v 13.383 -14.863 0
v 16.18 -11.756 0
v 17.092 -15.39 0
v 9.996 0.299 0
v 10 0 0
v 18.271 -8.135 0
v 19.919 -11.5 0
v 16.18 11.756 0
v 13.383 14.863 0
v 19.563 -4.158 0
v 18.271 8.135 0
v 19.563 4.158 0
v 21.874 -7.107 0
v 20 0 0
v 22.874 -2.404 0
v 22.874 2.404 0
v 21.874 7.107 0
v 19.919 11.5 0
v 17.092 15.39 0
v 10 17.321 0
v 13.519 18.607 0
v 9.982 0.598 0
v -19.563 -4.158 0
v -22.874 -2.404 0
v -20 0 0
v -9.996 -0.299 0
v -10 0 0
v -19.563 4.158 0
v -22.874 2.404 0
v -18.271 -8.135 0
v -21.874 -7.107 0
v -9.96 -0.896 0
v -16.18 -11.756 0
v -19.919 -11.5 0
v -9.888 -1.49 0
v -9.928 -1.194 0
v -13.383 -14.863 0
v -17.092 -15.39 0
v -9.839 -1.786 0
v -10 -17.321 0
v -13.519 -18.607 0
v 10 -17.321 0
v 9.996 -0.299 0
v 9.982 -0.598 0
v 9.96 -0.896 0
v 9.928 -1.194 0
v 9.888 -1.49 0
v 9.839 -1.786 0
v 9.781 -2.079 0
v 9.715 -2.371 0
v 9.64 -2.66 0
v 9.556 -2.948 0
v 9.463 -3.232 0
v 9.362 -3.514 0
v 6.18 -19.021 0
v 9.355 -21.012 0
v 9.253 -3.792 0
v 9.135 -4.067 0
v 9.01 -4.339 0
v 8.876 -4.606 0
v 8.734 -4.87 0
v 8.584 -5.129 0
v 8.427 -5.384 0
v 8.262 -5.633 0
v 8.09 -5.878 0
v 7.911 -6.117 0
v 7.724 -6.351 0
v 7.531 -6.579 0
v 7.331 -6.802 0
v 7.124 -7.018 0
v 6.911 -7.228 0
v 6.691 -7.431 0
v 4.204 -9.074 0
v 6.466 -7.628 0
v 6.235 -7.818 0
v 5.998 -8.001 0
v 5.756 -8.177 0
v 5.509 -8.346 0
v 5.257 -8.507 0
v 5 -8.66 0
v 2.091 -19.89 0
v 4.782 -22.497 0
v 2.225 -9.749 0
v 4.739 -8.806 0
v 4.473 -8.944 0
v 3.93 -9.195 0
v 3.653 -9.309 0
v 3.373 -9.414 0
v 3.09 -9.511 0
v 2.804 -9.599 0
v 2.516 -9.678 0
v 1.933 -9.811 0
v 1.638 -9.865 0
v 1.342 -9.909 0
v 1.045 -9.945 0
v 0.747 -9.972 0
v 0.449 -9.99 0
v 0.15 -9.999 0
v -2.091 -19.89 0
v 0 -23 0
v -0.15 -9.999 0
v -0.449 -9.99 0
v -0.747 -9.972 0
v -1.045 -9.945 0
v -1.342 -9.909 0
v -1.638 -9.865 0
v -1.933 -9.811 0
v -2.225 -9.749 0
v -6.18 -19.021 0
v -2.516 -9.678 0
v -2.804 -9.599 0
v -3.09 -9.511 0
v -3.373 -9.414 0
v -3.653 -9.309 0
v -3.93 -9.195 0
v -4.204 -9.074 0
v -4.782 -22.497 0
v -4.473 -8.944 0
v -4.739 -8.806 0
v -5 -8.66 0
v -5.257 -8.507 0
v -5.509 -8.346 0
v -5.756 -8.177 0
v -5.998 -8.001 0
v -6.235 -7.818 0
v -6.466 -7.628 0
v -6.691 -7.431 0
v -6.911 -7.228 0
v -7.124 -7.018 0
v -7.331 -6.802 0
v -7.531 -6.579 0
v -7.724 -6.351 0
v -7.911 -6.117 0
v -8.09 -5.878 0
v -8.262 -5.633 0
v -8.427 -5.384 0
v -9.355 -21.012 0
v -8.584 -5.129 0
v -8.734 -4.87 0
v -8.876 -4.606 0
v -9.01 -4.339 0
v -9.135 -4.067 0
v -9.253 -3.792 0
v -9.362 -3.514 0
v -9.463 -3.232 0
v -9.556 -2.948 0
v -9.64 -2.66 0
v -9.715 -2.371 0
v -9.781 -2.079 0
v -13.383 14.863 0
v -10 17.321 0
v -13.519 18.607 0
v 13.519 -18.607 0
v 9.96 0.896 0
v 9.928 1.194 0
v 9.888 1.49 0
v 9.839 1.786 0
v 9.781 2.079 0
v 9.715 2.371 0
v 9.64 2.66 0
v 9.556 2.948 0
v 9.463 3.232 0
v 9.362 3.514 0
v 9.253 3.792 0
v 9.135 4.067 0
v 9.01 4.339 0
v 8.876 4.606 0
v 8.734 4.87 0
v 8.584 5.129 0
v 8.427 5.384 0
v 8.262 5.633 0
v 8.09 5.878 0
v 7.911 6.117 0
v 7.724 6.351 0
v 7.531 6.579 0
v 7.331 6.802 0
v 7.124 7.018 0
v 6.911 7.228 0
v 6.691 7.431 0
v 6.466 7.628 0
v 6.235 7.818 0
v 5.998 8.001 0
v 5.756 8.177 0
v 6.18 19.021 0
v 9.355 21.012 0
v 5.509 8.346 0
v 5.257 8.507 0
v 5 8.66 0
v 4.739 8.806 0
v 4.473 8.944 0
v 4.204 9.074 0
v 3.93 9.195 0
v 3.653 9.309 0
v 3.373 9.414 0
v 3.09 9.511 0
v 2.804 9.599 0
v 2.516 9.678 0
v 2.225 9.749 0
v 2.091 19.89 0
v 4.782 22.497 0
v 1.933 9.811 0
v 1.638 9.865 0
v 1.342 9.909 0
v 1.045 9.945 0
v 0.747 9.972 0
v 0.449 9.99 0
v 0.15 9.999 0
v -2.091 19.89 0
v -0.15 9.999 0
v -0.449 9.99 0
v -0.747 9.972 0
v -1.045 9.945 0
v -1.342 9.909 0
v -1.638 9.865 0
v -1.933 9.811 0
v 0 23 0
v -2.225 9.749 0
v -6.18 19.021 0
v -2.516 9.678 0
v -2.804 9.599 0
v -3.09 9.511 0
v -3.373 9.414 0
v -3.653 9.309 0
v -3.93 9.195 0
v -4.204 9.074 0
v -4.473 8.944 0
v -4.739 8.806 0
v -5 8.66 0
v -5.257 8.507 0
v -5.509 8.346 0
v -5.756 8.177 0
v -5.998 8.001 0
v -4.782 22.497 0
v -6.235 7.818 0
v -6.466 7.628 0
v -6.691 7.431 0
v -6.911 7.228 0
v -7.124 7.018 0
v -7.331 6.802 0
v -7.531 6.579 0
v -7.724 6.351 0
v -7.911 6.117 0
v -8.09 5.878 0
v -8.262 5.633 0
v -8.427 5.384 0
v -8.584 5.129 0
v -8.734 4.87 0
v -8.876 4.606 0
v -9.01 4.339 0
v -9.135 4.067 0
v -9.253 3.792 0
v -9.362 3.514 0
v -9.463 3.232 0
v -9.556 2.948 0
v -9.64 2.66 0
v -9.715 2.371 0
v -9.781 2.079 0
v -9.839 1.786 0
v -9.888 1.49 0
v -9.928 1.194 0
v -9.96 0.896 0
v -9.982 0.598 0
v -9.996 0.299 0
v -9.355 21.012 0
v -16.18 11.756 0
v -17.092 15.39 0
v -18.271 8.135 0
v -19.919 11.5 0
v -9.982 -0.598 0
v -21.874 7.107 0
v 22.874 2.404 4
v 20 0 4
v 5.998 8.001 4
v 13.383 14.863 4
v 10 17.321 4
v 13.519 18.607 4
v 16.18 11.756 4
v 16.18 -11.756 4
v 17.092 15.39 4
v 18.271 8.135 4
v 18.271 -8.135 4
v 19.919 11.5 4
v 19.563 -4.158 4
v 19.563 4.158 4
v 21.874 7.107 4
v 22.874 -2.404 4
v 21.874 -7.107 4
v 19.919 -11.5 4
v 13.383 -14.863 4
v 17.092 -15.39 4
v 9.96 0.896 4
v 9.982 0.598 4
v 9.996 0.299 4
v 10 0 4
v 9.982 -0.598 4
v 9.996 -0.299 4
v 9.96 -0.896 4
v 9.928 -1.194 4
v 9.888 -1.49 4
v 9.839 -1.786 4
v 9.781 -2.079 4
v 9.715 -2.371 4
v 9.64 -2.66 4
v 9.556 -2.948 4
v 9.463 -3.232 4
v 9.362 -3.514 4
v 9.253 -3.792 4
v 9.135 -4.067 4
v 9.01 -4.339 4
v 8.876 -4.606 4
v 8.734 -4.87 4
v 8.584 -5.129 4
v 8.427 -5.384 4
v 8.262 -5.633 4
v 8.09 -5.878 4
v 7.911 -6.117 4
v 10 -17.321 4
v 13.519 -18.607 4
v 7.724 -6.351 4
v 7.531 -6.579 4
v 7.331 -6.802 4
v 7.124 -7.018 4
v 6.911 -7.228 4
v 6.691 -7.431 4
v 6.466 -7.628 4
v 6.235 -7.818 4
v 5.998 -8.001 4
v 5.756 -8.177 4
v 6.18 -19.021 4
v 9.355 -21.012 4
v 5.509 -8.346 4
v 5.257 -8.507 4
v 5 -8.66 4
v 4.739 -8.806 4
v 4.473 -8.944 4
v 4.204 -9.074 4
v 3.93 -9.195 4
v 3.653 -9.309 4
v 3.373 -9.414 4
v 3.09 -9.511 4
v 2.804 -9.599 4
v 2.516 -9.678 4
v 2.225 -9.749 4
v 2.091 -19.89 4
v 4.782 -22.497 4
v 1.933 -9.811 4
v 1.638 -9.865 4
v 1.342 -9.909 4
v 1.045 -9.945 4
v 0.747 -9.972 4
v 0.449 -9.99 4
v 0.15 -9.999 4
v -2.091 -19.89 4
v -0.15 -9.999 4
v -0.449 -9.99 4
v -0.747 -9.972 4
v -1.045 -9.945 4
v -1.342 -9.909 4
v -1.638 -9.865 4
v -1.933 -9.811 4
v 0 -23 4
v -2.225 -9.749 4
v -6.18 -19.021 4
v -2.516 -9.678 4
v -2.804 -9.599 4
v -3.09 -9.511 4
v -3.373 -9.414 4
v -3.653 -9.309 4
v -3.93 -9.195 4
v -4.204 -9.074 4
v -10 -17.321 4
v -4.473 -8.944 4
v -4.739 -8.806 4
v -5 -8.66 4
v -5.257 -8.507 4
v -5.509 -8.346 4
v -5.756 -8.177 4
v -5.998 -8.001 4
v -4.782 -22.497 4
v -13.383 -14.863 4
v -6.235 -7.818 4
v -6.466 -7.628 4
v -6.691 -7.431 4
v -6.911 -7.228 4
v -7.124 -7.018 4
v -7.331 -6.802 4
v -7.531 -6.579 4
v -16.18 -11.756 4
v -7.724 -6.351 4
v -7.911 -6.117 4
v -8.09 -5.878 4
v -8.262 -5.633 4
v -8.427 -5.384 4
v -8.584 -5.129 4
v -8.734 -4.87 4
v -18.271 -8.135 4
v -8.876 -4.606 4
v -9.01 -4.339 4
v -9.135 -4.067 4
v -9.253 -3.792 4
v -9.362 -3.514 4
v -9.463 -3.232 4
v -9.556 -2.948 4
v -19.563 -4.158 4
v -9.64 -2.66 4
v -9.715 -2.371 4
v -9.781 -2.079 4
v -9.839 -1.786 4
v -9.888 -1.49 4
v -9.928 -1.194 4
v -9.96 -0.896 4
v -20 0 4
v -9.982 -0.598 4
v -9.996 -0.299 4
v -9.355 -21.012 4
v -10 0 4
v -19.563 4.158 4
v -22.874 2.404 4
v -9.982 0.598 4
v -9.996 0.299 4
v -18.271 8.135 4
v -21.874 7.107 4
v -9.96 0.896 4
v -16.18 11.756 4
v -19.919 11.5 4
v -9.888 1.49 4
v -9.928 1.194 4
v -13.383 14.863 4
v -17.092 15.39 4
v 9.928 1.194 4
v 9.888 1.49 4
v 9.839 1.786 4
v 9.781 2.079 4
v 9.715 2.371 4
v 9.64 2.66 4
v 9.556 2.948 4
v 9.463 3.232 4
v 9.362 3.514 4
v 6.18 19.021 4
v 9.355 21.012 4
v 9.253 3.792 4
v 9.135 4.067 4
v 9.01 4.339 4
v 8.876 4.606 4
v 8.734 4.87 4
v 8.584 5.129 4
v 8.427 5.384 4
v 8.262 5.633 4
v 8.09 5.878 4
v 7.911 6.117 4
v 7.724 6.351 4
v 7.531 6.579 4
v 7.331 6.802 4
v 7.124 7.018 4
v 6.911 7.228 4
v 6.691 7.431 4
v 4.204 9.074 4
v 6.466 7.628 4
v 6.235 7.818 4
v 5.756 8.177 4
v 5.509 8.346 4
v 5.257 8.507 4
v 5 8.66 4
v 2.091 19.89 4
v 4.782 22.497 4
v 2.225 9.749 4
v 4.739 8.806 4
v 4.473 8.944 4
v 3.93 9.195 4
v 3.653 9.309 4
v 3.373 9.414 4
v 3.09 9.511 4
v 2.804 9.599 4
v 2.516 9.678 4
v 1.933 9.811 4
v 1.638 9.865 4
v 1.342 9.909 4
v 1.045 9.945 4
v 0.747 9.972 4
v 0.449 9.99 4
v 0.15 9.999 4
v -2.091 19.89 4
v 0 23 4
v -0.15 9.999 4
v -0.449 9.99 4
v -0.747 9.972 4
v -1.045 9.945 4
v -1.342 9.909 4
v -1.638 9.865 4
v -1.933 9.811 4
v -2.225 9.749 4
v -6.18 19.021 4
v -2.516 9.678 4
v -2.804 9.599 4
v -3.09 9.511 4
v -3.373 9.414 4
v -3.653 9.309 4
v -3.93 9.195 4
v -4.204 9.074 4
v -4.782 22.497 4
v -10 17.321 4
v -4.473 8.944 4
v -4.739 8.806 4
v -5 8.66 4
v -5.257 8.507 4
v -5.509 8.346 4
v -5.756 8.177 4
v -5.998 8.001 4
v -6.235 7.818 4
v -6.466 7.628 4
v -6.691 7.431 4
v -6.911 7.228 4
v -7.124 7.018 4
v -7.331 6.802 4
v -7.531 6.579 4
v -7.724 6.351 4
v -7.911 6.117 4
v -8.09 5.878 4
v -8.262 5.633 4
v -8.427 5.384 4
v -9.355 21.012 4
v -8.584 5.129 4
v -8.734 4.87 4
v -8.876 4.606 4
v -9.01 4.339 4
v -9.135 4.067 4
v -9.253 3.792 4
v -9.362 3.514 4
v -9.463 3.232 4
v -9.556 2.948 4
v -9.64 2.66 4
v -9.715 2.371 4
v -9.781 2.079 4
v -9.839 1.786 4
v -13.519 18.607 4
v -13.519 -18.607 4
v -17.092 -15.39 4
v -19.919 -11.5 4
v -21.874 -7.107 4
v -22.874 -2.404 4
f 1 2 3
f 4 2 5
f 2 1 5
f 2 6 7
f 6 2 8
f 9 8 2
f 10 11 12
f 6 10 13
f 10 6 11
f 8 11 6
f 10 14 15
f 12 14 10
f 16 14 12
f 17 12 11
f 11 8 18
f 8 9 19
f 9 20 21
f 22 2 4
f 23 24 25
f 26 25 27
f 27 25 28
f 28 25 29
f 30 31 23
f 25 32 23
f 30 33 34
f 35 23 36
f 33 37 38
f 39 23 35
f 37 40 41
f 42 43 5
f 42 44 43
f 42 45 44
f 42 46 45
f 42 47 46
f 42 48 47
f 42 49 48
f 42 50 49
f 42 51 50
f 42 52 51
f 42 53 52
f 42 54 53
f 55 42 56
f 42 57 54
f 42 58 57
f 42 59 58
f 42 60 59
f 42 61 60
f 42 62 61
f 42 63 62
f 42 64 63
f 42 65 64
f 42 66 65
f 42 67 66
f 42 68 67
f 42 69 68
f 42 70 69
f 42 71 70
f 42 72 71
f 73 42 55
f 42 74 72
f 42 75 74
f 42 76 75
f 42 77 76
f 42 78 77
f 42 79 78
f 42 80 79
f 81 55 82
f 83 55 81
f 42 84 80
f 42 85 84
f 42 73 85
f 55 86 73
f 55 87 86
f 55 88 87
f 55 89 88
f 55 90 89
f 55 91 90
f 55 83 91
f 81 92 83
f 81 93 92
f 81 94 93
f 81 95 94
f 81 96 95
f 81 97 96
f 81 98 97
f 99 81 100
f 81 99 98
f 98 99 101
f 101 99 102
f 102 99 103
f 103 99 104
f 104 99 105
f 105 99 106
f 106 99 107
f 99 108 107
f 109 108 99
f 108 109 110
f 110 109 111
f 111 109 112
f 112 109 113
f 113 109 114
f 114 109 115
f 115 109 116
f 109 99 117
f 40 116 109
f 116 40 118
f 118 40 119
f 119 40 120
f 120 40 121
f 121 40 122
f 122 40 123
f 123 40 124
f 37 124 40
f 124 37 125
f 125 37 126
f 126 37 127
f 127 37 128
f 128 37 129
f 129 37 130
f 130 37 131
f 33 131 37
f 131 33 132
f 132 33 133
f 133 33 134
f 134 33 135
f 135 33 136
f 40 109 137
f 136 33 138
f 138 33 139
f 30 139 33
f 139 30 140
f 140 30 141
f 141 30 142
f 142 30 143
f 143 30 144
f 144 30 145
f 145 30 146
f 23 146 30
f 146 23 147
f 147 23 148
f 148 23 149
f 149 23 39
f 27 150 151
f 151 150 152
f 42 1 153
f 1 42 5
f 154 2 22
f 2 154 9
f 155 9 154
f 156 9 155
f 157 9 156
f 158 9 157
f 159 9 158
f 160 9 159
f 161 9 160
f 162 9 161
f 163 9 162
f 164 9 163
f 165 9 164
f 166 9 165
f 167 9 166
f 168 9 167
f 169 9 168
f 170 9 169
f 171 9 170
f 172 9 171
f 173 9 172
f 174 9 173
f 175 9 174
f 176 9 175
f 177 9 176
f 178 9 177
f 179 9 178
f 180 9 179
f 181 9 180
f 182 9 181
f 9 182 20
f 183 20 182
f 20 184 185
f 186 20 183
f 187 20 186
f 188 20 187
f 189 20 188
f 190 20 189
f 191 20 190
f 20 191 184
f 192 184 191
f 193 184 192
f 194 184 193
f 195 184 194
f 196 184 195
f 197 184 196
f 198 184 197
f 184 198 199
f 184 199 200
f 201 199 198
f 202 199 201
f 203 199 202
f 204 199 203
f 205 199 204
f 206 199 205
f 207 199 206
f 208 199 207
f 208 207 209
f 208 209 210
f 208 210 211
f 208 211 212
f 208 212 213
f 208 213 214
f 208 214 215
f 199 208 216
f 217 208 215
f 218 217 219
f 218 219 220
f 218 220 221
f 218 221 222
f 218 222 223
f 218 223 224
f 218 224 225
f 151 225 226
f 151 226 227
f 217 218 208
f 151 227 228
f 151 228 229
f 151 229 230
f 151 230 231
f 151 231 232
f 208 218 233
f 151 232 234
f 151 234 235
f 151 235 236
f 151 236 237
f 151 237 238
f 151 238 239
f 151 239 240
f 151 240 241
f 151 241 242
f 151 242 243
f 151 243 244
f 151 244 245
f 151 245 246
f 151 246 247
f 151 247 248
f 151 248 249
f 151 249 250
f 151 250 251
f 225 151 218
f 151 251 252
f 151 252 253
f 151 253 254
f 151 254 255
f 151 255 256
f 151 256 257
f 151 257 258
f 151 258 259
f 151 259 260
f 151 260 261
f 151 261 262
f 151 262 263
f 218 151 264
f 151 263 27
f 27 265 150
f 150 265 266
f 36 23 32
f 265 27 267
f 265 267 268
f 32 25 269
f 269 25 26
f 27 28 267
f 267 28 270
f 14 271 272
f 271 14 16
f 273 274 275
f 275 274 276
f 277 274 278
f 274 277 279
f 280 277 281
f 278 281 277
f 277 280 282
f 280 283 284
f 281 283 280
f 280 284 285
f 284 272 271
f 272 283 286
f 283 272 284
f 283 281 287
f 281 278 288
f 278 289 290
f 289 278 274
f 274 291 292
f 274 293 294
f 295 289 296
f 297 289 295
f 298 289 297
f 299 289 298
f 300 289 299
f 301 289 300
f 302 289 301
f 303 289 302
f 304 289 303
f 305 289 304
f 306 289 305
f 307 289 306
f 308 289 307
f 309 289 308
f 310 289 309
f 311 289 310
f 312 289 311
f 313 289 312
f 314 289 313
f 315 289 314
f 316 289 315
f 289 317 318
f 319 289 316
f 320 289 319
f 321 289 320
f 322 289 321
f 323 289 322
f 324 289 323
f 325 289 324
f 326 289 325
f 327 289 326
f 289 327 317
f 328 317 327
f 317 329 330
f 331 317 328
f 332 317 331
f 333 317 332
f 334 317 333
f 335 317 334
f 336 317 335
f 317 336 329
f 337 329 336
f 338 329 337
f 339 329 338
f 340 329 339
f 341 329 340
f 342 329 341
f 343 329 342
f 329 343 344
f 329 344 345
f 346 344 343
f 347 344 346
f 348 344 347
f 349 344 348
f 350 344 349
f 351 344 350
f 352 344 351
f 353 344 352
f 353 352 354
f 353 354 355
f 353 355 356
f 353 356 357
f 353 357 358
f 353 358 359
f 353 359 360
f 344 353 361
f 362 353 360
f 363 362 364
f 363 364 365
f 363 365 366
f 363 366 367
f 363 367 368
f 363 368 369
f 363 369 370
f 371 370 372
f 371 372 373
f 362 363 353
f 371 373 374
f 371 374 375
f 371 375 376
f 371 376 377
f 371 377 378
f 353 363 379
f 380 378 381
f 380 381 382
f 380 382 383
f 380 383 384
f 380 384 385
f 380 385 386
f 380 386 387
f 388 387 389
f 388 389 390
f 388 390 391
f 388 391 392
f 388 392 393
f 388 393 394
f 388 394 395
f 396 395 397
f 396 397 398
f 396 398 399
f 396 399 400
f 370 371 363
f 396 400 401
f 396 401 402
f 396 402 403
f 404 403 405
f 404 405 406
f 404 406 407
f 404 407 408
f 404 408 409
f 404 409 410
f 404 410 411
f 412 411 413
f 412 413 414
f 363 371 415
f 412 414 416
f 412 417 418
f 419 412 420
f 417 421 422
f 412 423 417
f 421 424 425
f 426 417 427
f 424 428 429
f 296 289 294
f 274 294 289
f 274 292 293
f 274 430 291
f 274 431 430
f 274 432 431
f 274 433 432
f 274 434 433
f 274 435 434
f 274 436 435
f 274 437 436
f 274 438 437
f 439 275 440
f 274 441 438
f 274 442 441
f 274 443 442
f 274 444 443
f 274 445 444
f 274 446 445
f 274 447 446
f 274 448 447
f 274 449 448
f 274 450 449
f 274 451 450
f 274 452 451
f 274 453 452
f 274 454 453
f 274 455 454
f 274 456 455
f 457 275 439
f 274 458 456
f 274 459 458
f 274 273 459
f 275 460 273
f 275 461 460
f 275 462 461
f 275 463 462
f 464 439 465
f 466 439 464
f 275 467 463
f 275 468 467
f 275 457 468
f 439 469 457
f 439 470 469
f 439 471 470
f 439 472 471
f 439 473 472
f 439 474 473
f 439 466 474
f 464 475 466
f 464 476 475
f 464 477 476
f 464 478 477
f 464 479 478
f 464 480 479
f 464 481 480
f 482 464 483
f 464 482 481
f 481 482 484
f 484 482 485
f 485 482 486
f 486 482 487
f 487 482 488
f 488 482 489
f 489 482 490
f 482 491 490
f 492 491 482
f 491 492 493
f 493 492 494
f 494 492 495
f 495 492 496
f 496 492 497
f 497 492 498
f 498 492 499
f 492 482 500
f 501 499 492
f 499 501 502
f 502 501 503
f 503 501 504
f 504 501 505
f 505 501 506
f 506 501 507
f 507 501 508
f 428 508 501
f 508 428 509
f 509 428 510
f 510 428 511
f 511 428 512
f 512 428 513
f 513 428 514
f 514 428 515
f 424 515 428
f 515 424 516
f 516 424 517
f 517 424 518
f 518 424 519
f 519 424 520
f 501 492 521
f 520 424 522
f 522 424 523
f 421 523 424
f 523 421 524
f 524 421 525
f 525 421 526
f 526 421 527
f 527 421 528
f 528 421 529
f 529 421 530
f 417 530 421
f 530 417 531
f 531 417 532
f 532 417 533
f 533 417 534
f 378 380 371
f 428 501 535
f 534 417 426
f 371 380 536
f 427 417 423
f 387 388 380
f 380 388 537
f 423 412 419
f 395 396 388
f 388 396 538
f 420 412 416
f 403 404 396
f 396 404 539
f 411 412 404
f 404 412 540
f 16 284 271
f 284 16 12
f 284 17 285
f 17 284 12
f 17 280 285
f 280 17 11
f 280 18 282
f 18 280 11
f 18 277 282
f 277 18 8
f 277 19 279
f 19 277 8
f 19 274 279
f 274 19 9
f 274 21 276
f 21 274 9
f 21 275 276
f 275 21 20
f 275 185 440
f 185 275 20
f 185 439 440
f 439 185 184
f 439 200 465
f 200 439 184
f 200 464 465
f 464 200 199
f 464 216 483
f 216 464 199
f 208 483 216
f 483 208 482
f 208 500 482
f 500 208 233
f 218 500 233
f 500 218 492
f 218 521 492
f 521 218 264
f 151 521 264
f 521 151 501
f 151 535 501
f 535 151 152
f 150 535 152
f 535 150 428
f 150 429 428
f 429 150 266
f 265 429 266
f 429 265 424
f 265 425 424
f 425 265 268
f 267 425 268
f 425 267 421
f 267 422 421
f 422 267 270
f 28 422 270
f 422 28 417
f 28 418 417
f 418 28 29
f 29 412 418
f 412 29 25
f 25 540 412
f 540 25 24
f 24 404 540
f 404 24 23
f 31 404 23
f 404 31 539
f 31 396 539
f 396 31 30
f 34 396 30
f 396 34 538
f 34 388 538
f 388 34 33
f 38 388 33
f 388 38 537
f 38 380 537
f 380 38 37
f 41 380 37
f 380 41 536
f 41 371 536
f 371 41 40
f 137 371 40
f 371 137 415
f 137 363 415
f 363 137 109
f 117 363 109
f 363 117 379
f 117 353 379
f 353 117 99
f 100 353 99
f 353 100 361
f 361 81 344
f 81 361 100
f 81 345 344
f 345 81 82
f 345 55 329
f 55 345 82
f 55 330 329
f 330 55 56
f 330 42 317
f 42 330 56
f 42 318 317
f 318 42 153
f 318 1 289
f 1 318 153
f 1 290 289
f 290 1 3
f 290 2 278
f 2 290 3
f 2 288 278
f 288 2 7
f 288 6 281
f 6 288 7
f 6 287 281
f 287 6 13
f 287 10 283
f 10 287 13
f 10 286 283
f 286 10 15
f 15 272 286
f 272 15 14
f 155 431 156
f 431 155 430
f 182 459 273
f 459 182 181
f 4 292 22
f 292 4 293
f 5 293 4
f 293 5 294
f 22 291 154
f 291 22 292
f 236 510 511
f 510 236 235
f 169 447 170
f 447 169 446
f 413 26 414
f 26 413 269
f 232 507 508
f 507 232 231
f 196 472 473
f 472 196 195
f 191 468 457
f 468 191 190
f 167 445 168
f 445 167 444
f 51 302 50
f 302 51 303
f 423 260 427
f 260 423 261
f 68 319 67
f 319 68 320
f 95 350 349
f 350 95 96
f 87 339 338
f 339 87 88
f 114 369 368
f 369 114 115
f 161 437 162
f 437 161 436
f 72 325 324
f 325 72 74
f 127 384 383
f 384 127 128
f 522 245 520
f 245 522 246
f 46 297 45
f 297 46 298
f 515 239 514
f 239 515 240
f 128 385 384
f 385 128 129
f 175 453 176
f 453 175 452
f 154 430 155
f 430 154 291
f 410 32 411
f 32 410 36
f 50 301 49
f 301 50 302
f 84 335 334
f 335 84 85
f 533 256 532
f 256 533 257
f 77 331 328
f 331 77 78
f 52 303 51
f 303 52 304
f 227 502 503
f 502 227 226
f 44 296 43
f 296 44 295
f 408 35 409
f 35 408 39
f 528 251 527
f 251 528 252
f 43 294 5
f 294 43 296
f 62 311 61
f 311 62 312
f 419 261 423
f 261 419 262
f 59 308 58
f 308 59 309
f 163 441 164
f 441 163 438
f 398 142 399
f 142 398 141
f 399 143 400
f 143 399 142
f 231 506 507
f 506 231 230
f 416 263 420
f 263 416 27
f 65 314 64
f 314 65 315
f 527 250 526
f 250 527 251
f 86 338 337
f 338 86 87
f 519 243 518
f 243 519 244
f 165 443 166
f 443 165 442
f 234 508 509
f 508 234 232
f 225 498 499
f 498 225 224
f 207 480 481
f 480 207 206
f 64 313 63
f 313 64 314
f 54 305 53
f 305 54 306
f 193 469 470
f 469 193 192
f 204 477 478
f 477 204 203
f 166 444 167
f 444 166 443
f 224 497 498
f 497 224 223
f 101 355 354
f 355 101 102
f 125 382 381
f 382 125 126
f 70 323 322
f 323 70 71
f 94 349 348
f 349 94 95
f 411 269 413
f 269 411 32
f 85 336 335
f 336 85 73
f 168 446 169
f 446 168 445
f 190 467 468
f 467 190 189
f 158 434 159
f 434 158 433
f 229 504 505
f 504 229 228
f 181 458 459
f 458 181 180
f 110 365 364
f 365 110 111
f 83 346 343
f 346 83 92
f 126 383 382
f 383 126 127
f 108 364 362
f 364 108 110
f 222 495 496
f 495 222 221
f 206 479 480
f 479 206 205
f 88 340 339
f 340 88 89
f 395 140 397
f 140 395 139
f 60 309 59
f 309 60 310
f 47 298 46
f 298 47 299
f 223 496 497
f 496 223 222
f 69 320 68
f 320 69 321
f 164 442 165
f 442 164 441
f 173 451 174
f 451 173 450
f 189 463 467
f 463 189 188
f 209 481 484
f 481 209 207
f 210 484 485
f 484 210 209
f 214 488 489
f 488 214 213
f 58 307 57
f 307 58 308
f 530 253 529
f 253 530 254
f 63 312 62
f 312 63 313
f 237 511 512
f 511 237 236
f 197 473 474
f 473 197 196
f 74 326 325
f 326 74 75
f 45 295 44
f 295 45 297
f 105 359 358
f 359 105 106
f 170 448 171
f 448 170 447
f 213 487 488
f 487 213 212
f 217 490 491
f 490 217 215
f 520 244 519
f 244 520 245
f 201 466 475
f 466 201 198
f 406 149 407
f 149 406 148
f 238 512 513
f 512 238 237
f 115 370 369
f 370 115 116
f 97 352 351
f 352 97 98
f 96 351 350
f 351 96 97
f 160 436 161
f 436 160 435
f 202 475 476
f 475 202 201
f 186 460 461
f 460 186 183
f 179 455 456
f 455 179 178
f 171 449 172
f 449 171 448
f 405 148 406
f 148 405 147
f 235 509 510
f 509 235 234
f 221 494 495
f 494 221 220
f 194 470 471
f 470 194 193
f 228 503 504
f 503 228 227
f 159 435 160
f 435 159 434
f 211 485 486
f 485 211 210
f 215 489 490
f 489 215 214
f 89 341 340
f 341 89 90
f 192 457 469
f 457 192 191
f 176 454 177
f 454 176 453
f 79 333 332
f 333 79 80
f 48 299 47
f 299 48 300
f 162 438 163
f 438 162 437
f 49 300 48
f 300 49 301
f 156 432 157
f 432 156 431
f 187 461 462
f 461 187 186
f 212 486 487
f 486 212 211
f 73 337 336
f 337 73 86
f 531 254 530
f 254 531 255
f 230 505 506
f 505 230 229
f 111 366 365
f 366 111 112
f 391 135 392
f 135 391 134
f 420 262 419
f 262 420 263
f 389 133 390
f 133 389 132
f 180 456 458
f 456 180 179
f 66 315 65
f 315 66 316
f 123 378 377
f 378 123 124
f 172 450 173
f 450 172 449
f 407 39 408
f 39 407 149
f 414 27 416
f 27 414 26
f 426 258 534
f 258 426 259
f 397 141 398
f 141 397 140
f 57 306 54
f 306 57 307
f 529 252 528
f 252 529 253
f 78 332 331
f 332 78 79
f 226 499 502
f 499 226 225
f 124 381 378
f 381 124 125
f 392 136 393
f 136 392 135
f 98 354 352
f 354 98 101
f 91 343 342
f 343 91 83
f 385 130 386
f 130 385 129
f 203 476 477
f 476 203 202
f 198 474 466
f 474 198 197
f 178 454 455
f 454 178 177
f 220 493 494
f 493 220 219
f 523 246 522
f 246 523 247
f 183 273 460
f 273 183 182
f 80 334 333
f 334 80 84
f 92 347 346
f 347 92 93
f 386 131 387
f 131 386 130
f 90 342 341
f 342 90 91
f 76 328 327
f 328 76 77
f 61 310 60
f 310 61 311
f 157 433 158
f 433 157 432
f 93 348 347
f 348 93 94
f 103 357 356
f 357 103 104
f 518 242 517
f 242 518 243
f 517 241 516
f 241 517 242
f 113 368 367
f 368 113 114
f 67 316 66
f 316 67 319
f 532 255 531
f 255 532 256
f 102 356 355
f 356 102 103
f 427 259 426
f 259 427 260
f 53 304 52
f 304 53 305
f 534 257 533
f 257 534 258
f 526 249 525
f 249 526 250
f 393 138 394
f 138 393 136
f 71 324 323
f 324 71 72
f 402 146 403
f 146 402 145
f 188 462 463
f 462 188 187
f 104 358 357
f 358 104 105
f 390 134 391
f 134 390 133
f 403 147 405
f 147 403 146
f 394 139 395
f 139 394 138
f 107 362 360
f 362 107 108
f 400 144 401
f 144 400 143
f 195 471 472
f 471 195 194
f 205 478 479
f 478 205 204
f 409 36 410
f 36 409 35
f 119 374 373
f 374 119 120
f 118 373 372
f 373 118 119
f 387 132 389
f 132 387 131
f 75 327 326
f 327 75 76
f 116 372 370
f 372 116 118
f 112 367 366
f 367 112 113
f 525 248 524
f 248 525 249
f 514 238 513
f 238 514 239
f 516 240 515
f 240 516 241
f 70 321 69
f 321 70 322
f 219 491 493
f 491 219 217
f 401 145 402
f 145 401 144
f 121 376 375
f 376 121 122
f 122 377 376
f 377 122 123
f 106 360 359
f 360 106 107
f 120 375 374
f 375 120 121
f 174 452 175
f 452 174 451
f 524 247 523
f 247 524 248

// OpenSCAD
height = 4;
radius = 20;
inner_radius = radius / 2;
teeth_depth = 3;
teeth = 30;
$fs = 0.3;
$fa = 1;

difference() {
	union() {
		cylinder(h=height, r=radius, $fn=teeth);
		for(tooth = [0:teeth]) {
			rotate([0, 0, tooth * 360 / teeth]) {
				linear_extrude(height=height) {
					polygon(points=[[radius, 0], [cos(360 / teeth) * radius, sin(360 / teeth) * radius], [cos(180 / teeth) * (radius + teeth_depth), sin(180 / teeth) * (radius + teeth_depth)]], convexity=1);
				}
			}
		}
	}
	translate([0, 0, -1]) {
		cylinder(r=inner_radius, h=6);
	}
}
